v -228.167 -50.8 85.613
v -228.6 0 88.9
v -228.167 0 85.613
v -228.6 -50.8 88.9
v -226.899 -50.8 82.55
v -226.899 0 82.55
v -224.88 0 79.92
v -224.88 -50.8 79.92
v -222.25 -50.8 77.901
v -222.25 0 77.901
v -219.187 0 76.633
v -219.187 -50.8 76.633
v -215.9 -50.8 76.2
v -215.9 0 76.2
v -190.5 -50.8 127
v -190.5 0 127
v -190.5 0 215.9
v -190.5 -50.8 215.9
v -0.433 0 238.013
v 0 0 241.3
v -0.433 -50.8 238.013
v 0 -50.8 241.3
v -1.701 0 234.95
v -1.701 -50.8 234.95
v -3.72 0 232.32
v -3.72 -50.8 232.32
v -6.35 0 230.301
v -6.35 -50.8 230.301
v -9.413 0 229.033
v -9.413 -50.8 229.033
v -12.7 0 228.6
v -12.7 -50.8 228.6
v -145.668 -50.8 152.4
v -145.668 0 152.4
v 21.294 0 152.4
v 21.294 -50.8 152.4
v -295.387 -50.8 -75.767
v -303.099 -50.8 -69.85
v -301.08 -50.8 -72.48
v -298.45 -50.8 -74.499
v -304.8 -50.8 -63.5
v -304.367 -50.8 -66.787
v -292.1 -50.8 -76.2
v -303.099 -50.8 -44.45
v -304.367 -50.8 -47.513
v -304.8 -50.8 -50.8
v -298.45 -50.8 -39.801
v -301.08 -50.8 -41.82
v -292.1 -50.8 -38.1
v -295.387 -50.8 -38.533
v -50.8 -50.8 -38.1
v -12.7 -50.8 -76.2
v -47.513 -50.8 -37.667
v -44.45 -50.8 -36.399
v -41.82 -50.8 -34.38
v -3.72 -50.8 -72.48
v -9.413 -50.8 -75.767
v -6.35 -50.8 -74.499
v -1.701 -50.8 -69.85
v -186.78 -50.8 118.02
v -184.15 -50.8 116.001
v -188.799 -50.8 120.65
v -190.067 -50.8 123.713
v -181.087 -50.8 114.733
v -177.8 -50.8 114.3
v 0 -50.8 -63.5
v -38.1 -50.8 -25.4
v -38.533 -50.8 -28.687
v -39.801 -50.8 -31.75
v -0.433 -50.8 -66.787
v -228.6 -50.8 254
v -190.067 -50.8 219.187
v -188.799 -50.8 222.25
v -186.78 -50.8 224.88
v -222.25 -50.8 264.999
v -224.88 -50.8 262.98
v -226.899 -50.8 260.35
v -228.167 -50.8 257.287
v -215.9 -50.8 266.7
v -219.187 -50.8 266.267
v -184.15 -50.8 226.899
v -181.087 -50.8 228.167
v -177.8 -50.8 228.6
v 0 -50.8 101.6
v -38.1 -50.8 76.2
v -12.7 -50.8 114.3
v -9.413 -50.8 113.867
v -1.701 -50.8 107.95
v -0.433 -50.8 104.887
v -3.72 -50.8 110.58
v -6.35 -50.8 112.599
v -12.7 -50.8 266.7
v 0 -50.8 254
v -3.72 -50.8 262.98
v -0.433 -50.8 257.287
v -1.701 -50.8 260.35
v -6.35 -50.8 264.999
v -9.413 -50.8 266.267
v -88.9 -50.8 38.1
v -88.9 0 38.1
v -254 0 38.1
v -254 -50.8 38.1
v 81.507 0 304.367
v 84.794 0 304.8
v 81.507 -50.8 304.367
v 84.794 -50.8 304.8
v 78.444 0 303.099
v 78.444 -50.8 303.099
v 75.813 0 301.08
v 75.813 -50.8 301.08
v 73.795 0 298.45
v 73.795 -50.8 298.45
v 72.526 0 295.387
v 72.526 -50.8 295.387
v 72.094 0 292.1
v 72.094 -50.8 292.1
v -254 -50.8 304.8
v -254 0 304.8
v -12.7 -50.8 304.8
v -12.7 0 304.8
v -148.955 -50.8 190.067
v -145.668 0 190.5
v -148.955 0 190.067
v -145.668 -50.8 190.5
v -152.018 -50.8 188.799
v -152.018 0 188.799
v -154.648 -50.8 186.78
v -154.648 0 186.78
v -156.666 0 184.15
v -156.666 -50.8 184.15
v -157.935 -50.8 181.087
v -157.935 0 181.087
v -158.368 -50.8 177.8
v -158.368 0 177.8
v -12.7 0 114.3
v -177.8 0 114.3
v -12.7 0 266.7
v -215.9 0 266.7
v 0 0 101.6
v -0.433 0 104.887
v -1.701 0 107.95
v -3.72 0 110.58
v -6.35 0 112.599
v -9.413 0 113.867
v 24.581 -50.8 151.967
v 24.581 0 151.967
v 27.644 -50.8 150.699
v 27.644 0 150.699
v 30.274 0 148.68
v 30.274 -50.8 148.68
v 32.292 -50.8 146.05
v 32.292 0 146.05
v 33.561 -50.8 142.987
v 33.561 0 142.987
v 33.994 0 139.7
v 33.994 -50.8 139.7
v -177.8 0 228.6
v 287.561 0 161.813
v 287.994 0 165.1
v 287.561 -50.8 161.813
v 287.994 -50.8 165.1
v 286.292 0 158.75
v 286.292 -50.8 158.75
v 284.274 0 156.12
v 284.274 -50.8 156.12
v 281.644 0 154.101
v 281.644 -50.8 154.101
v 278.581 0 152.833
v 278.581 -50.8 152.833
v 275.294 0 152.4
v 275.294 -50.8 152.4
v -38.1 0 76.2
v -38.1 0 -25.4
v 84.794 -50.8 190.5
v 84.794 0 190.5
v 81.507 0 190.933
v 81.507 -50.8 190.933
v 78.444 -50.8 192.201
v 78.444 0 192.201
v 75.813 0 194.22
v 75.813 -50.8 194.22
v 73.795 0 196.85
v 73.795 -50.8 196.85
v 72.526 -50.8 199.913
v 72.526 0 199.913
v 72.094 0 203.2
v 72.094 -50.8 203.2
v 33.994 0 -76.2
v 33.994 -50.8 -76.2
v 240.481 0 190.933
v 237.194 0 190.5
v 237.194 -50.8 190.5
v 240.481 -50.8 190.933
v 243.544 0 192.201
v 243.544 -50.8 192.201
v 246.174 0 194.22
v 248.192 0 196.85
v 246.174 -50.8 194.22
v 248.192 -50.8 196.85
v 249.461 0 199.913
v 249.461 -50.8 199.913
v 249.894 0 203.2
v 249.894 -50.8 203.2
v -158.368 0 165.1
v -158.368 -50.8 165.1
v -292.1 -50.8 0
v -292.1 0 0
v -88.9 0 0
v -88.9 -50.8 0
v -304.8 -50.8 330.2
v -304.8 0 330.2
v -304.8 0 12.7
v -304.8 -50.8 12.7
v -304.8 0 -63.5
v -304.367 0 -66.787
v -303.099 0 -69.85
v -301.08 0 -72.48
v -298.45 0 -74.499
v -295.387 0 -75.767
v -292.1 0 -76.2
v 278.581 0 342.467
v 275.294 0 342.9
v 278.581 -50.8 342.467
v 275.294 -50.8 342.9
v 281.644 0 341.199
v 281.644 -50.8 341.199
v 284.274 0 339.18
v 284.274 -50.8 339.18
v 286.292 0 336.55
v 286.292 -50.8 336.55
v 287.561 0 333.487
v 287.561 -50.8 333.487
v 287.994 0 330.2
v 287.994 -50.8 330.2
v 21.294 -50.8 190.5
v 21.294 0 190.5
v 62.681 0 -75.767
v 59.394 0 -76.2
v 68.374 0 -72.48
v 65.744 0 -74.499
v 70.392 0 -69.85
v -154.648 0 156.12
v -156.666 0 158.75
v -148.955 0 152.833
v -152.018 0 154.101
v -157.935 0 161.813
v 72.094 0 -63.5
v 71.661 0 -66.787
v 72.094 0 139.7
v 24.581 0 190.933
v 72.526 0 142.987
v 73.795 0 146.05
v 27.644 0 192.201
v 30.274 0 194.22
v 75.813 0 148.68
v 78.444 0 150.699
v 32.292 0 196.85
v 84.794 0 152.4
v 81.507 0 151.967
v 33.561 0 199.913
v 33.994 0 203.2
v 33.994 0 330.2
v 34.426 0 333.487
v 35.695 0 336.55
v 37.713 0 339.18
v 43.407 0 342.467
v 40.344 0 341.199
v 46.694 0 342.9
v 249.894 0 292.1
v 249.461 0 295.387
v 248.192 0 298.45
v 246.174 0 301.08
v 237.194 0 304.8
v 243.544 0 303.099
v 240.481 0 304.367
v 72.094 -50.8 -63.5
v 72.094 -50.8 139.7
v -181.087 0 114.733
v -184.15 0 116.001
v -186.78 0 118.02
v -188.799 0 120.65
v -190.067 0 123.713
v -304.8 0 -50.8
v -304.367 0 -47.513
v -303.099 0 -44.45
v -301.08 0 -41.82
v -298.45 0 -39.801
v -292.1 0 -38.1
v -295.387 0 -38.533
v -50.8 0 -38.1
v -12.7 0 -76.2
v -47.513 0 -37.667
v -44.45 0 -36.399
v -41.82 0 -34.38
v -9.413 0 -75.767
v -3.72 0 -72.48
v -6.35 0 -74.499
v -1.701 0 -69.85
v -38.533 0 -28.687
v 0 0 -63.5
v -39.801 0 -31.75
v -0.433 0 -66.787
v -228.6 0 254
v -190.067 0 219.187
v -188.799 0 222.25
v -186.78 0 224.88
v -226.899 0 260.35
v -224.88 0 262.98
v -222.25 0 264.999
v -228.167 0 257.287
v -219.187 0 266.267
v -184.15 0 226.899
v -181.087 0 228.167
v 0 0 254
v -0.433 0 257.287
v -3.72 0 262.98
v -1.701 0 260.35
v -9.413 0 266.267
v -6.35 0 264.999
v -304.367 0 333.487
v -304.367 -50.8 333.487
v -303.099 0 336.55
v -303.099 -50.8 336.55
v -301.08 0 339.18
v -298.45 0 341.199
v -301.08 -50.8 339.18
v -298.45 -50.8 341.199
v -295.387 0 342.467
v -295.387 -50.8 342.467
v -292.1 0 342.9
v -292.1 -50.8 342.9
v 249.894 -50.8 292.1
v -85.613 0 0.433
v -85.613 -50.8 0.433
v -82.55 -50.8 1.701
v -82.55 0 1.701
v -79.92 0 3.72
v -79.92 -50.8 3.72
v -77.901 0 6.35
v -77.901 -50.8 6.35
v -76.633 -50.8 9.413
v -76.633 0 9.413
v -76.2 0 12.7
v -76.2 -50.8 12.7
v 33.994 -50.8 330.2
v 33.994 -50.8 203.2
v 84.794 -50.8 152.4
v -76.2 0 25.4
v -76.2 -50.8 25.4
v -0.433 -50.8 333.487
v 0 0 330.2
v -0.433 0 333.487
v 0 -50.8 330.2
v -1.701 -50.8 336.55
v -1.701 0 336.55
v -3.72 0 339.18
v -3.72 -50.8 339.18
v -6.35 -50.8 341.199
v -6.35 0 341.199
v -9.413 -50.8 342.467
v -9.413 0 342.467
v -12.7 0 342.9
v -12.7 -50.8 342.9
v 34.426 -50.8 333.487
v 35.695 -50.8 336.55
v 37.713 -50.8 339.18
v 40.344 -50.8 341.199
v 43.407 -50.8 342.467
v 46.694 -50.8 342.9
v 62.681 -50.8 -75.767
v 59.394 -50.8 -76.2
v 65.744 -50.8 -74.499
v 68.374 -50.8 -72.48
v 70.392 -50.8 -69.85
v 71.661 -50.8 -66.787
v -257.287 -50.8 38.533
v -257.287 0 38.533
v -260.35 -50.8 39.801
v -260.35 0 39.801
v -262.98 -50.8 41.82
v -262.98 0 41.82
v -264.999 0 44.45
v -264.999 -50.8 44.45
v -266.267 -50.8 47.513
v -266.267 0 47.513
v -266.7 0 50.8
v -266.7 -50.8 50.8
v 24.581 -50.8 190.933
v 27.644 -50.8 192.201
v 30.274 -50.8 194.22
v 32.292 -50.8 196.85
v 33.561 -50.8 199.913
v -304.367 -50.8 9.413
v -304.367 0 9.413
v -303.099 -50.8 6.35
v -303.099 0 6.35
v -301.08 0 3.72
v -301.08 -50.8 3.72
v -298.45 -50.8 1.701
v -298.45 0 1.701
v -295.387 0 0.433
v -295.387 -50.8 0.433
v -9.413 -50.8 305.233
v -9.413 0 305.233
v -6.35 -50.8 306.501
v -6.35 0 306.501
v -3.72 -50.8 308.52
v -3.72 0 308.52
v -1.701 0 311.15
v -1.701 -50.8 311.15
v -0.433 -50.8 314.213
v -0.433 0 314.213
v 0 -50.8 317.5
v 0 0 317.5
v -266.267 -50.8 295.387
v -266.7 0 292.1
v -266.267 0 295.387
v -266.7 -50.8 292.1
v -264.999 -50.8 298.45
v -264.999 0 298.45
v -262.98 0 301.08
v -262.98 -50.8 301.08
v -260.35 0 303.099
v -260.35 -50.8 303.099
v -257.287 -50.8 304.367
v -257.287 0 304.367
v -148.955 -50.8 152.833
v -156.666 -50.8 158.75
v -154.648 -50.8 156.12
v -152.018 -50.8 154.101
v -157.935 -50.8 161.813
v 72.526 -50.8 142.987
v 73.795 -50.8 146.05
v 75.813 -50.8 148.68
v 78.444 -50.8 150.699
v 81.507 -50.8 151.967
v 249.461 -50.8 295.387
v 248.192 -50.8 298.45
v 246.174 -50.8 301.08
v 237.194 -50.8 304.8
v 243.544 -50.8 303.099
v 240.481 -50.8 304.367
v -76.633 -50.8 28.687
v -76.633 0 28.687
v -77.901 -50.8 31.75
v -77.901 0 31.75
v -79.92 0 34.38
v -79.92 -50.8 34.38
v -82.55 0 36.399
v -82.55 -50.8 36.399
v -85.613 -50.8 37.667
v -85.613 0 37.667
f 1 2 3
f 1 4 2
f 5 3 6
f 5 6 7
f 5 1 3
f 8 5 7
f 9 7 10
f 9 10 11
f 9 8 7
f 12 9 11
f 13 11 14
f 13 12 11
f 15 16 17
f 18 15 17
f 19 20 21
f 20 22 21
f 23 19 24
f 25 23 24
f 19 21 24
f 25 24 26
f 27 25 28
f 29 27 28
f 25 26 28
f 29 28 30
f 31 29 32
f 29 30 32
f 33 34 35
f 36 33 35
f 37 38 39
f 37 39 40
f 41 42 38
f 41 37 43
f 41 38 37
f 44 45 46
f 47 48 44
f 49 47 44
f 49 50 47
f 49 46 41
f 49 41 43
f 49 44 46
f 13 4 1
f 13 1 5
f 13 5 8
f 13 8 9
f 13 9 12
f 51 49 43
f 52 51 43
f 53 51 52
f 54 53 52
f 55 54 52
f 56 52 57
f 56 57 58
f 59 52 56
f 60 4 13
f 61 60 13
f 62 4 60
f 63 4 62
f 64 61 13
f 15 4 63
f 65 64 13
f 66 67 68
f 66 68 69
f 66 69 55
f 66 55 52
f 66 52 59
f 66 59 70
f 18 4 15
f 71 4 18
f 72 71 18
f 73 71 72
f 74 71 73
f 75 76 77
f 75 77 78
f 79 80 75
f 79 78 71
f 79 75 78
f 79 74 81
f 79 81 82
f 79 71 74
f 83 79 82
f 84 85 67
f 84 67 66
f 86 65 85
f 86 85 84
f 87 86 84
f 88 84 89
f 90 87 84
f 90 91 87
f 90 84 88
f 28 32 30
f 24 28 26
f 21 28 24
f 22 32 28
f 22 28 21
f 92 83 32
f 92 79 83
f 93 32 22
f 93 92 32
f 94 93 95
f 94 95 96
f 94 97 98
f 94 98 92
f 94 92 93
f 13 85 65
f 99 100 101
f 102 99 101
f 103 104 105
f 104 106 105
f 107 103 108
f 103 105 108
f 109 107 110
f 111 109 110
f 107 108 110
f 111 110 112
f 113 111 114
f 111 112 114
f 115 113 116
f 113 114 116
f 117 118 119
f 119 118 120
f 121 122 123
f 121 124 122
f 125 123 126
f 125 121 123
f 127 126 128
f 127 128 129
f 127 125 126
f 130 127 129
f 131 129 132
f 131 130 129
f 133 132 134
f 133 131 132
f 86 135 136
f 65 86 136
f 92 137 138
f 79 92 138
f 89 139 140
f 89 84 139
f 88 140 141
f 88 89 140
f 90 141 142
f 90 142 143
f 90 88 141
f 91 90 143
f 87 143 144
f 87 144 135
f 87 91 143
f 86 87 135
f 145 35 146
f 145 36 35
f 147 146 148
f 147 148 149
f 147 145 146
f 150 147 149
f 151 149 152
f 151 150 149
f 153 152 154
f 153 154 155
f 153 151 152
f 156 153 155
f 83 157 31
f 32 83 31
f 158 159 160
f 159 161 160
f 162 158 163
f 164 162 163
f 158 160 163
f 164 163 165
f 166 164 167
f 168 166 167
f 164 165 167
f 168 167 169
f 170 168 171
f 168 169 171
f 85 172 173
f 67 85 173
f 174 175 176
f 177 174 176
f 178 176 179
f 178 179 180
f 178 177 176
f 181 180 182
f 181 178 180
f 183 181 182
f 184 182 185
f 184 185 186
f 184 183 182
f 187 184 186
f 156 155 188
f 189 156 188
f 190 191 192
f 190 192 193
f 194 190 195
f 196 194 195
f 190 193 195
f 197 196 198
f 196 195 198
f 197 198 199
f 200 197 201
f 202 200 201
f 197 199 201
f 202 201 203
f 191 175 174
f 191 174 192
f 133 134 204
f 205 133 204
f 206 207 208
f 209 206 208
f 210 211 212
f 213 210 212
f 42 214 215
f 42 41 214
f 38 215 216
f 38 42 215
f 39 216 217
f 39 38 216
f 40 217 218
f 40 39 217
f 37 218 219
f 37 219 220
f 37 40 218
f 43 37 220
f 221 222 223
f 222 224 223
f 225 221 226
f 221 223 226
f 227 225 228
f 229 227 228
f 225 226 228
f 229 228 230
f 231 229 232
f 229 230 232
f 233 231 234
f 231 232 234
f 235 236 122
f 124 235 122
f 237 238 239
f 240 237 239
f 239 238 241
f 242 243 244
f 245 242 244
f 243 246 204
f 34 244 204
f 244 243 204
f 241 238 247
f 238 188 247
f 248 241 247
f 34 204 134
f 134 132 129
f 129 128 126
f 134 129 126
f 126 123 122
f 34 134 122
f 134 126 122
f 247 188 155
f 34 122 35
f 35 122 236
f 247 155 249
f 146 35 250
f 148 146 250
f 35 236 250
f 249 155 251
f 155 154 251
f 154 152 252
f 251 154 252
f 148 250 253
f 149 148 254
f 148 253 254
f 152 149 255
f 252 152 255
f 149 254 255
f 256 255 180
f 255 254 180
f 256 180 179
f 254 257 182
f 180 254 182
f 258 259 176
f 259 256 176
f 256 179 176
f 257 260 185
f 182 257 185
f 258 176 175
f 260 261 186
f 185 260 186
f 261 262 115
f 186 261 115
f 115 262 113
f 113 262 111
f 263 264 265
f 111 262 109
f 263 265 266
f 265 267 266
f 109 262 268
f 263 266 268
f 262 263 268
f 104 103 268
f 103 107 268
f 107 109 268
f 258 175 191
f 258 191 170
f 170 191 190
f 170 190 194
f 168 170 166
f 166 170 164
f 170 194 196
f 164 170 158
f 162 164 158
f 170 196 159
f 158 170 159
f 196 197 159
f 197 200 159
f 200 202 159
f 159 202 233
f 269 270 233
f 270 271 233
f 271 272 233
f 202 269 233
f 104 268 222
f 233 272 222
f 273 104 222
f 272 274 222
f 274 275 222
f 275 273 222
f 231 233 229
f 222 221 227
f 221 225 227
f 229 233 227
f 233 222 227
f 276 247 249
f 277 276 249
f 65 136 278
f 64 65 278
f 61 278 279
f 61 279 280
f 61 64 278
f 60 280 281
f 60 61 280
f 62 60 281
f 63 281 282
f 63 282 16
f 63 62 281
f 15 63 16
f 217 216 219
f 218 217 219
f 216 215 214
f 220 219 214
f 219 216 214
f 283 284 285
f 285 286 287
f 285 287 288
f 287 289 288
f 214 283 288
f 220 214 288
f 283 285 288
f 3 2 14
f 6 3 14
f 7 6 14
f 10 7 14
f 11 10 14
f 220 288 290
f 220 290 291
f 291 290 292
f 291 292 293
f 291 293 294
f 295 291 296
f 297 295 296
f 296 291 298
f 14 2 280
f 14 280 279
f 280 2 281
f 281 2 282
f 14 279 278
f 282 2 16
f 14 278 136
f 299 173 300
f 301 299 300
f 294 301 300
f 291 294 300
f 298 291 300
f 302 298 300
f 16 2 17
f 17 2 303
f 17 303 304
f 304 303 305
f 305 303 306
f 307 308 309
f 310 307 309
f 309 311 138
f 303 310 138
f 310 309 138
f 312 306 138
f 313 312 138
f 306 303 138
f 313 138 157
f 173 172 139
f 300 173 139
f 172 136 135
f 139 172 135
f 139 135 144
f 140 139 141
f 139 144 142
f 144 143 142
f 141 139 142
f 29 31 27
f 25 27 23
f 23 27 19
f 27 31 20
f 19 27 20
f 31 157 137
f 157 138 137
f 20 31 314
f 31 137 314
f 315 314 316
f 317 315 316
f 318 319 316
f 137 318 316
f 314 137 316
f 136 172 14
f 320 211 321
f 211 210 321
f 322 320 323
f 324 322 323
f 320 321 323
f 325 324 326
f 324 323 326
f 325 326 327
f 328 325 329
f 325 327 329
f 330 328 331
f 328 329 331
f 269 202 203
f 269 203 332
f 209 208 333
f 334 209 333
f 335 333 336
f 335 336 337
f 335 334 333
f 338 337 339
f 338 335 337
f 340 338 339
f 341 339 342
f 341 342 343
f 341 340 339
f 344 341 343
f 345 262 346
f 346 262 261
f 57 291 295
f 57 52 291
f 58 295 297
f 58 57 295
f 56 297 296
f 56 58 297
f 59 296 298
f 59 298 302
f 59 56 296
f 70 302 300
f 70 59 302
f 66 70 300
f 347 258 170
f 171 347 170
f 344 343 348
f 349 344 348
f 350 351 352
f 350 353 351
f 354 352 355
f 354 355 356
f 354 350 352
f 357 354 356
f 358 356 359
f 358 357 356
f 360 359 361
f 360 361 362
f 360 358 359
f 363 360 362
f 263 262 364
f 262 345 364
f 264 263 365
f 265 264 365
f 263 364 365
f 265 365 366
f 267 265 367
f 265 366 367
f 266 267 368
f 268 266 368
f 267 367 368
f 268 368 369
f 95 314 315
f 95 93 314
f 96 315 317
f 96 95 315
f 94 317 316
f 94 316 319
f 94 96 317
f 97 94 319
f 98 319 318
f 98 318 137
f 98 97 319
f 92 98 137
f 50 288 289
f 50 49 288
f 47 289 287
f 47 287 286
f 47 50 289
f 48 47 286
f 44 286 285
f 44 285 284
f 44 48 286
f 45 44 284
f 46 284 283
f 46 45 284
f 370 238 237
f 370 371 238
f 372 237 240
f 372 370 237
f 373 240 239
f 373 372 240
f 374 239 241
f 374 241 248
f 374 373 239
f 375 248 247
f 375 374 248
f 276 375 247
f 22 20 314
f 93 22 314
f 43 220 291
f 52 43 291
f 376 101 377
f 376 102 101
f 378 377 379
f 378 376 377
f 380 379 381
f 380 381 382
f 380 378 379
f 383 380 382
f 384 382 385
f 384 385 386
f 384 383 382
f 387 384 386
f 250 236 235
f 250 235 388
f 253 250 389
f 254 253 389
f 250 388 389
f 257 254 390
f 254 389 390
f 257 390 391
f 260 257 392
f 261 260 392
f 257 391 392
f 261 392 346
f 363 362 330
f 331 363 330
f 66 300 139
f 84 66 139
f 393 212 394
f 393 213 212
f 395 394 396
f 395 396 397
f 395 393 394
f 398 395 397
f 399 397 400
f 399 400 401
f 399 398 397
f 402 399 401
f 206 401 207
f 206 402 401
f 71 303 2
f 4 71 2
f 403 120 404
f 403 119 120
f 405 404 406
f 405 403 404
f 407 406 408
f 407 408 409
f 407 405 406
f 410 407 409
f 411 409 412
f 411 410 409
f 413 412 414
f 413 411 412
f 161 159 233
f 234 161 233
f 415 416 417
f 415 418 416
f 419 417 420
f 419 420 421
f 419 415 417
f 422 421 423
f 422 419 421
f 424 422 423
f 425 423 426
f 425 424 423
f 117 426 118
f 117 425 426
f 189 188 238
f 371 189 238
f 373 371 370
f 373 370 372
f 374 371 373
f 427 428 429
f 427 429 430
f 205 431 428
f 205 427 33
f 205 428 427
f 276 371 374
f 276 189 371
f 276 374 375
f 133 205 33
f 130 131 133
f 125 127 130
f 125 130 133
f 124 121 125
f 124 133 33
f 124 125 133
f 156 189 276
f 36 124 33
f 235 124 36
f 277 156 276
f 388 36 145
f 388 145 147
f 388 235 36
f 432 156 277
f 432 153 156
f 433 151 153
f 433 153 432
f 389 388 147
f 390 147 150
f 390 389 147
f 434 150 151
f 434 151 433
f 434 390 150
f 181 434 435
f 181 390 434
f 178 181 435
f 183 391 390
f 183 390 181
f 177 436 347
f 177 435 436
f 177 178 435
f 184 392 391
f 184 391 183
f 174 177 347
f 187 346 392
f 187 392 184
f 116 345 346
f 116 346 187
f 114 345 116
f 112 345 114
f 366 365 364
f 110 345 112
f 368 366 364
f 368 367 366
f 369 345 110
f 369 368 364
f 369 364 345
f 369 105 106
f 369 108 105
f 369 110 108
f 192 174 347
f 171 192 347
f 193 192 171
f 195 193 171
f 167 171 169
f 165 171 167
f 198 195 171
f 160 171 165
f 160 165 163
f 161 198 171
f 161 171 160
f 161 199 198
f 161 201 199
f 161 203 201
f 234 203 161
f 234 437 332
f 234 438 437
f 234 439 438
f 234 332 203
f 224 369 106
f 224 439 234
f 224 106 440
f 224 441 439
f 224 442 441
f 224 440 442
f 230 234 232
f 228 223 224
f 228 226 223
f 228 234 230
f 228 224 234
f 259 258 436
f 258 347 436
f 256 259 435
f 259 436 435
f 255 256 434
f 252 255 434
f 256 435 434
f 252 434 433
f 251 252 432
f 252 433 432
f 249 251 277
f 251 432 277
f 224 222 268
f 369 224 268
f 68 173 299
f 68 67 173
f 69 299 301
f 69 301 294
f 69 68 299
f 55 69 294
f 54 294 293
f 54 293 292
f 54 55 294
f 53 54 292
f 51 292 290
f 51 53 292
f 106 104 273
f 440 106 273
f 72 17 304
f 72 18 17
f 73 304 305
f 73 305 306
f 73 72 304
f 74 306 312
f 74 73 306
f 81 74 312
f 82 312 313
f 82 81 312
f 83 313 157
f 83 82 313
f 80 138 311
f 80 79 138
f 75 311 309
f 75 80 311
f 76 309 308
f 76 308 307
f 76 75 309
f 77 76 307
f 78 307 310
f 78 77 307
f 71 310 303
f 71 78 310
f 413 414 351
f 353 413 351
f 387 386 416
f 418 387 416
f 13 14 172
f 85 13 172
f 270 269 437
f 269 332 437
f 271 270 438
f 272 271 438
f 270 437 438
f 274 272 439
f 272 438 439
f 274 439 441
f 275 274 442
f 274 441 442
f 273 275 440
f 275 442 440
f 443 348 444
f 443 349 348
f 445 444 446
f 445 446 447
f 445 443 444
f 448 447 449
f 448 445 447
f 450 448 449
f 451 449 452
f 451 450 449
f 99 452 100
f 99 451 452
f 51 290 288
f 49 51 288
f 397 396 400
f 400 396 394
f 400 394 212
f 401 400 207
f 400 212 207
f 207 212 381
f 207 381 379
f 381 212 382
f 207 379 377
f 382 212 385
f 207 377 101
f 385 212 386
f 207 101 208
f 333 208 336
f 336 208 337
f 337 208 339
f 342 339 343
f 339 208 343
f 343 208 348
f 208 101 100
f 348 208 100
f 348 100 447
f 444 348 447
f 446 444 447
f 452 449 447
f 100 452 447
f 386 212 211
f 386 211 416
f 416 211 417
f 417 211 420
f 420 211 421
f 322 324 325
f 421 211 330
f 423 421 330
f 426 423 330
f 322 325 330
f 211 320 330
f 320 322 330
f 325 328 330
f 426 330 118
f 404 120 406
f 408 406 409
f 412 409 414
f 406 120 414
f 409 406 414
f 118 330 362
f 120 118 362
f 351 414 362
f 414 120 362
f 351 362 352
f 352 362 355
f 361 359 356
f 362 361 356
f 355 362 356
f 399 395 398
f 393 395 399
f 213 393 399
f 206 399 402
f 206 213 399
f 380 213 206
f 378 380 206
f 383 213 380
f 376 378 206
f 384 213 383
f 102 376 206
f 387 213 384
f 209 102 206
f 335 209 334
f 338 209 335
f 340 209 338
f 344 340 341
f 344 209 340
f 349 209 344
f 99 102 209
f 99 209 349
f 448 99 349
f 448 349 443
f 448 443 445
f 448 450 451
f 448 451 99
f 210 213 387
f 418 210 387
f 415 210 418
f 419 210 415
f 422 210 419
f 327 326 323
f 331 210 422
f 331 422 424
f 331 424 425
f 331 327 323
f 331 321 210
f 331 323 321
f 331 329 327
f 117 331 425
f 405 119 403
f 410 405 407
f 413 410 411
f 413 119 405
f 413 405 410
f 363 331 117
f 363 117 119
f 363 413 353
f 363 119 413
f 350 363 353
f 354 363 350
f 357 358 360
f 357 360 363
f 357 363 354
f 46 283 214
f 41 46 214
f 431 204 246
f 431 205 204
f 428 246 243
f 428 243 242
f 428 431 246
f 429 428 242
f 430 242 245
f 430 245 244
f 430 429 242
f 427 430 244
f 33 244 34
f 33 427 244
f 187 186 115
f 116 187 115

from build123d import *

# Parameters (mm, degrees)
F0_W     = 177.8
F0_H     = 114.3
F1_DEPTH = 50.8
F2_R     = 12.7


with BuildPart() as f1:
    # F0 (on Front) → F1 (new body)
    with BuildSketch(Plane.XZ):
        Polygon((-304.8, 342.9), (-304.8, 0), (-76.2, 0), (-76.2, 38.1), (-266.7, 38.1), (-266.7, 304.8), (0, 304.8), (0, 342.9), align=None)
        Polygon((0, 228.6), (0, 266.7), (-228.6, 266.7), (-228.6, 76.2), (-38.1, 76.2), (-38.1, -38.1), (-304.8, -38.1), (-304.8, -76.2), (0, -76.2), (0, 114.3), (-190.5, 114.3), (-190.5, 228.6), align=None)
        Polygon((33.993531, 190.5), (-158.3675, 190.5), (-158.3675, 152.4), (33.993531, 152.4), (33.993531, -76.2), (72.093531, -76.2), (72.093531, 152.4), (287.993531, 152.4), (287.993531, 342.9), (33.993531, 342.9), align=None)
        with Locations((160.993531, 247.65)):
            Rectangle(F0_W, F0_H, mode=Mode.SUBTRACT)
    extrude(amount=F1_DEPTH)

    # F2
    f2_edges = [f1.edges().sort_by_distance(p)[0] for p in [
        (287.993531, -25.4, 342.9),
        (287.993531, -25.4, 152.4),
        (33.993531, -25.4, 342.9),
        (0, -25.4, 342.9),
        (0, -25.4, 304.8),
        (0, -25.4, 266.7),
        (0, -25.4, 228.6),
        (-158.3675, -25.4, 190.5),
        (-228.6, -25.4, 266.7),
        (-304.8, -25.4, 342.9),
        (-304.8, -25.4, -38.1),
        (0, -25.4, 114.3),
        (72.093531, -25.4, -76.2),
        (0, -25.4, -76.2),
        (-190.5, -25.4, 114.3),
        (-266.7, -25.4, 38.1),
        (-266.7, -25.4, 304.8),
        (-190.5, -25.4, 228.6),
        (-158.3675, -25.4, 152.4),
        (72.093531, -25.4, 304.8),
        (72.093531, -25.4, 152.4),
        (72.093531, -25.4, 190.5),
        (-304.8, -25.4, -76.2),
        (-304.8, -25.4, 0),
        (-228.6, -25.4, 76.2),
        (33.993531, -25.4, 190.5),
        (33.993531, -25.4, 152.4),
        (249.893531, -25.4, 190.5),
        (249.893531, -25.4, 304.8),
        (-76.2, -25.4, 38.1),
        (-38.1, -25.4, -38.1),
        (-76.2, -25.4, 0),
    ]]
    fillet(f2_edges, radius=F2_R)


solid = f1.part
